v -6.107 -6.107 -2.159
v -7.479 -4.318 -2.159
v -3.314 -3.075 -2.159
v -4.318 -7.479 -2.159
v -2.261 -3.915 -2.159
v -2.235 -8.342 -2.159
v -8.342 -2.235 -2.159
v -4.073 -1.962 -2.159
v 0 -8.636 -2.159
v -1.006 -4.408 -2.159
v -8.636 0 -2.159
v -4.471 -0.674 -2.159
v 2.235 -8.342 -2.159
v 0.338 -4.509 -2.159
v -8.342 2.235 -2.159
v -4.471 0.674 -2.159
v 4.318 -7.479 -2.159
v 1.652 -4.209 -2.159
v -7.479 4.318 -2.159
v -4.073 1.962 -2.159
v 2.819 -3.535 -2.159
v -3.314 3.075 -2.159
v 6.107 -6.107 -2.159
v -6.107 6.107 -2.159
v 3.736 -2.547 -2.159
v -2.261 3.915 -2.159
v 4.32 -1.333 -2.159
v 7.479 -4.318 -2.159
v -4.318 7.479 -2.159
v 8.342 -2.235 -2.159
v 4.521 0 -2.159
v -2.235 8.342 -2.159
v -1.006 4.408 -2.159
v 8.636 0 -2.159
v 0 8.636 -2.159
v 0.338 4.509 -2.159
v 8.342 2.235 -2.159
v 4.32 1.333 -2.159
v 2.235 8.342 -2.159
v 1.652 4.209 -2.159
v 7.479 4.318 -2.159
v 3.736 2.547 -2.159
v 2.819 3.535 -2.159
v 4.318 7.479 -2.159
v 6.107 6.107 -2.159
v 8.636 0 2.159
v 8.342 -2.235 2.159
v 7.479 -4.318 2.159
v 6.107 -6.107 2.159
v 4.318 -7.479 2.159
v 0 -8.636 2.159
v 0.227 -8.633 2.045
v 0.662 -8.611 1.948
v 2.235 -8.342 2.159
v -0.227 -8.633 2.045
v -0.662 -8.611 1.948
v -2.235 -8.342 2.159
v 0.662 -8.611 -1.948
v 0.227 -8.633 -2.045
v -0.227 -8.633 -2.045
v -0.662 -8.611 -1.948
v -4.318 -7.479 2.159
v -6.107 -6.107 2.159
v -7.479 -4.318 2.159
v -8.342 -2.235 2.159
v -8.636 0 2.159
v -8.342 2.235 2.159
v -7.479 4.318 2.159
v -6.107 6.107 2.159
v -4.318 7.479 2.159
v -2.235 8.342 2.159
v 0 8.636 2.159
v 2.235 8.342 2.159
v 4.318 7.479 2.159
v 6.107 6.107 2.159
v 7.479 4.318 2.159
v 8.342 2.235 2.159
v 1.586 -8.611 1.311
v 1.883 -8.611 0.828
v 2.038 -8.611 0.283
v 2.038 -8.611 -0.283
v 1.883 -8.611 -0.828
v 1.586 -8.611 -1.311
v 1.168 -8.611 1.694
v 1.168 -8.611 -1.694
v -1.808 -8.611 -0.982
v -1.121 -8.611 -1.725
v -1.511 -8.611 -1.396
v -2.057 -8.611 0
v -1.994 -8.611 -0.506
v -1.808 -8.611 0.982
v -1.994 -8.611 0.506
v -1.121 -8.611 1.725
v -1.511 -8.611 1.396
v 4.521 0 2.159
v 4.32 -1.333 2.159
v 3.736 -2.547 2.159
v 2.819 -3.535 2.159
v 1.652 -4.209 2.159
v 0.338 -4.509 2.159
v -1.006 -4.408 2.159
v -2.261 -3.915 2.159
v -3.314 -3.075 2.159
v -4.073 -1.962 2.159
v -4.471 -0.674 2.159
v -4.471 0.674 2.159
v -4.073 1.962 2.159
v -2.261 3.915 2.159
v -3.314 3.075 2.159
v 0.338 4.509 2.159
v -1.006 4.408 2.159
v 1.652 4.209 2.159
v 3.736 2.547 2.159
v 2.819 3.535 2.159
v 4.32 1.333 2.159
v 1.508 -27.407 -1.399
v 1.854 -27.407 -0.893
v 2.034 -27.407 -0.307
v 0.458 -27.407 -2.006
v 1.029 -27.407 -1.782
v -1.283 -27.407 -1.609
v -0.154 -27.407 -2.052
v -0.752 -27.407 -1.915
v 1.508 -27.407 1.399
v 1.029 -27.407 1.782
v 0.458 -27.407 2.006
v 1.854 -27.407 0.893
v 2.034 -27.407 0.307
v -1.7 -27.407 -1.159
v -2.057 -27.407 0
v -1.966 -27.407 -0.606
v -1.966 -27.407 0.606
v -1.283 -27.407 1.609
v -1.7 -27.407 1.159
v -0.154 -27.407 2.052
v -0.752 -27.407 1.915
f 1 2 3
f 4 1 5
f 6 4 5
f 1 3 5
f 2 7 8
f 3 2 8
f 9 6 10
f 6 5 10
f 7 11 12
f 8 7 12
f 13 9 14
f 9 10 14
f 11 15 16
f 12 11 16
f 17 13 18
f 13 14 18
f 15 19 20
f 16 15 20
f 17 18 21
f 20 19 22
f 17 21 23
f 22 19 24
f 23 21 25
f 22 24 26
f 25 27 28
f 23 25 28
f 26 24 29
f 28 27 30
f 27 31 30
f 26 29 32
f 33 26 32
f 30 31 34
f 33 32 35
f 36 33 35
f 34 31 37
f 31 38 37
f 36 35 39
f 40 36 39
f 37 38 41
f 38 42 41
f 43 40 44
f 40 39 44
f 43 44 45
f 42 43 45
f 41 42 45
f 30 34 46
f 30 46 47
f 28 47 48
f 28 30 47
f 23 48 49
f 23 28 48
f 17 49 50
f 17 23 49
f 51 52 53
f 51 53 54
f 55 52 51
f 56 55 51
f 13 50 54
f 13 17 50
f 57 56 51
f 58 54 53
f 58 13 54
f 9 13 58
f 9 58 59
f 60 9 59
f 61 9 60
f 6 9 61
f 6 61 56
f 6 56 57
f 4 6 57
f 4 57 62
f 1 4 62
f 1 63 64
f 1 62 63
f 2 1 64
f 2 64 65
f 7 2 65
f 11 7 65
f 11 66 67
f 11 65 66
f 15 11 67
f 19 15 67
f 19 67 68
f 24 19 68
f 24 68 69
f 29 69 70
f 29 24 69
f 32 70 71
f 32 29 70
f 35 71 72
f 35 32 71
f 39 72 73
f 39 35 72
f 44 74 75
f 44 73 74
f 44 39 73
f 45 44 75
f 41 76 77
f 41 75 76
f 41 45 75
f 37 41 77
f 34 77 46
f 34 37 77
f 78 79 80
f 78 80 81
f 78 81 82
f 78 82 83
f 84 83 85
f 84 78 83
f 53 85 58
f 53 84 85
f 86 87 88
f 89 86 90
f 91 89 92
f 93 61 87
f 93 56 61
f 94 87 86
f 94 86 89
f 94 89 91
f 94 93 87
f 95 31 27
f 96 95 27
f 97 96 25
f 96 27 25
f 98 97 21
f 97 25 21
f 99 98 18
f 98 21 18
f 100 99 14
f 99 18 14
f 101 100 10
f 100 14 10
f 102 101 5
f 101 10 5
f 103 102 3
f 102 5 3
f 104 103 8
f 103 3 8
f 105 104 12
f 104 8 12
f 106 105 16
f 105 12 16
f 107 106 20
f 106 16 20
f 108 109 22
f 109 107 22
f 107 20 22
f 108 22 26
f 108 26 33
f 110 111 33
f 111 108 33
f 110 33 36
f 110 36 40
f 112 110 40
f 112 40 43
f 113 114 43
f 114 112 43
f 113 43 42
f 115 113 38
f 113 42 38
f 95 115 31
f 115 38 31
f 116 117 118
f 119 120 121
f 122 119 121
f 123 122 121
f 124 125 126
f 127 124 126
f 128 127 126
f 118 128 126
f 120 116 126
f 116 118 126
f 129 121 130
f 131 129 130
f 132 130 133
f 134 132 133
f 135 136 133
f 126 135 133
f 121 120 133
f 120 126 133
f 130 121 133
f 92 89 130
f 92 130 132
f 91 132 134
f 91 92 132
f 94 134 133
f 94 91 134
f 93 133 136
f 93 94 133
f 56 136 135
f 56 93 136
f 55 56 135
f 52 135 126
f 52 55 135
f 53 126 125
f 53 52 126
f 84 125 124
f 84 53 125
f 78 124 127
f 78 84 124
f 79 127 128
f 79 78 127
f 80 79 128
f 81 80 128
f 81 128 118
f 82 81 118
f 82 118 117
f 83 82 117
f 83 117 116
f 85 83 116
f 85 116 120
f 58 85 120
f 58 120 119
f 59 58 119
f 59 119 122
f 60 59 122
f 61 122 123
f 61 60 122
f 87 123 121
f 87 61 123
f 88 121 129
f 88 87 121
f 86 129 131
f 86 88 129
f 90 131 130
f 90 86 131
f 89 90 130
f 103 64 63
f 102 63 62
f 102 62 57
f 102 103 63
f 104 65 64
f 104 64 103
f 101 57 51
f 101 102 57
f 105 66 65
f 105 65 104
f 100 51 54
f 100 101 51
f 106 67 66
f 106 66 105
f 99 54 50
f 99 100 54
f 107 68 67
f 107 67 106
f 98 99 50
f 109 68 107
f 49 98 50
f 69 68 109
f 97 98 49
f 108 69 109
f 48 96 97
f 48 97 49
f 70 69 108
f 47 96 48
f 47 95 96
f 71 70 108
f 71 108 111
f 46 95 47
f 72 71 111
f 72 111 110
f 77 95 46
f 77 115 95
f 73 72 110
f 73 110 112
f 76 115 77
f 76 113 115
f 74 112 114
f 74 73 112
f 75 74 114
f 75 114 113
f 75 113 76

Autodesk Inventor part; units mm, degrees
ref_plane "XY Plane" through (0, 0, 0) normal (0, 0, 1) x (1, 0, 0)
ref_plane "Work Plane1" through (6.5151, 0, 0) normal (1, 0, 0) x (0, 1, 0)
sketch "Sketch2" plane through (0, 0, 0) normal (0, 0, 1) x (1, 0, 0)
  circle A0 centre (0, 0) radius 8.636
  circle A1 centre (0, 0) radius 4.5212
  line L0 (0, -8.636) -> (0, -27.432) construction
  dimension "d2" = 17.272
  dimension "d3" = 4.1148
  dimension "d4" = 18.796
extrude "Extrusion1" add sketch "Sketch2" along normal mid plane 4.318
ref_plane "Work Plane2" through (0, -8.6106, 0) normal (0, 1, 0) x (-1, 0, 0)
sketch "Sketch3" plane through (0, -8.6106, 0) normal (0, 1, 0) x (-1, 0, 0)
  circle A0 centre (0, 0) radius 2.0574
  dimension "d8" = 4.1148
extrude "Extrusion2" add sketch "Sketch3" against normal blind 18.796
properties part number "eye screw stand-in"
